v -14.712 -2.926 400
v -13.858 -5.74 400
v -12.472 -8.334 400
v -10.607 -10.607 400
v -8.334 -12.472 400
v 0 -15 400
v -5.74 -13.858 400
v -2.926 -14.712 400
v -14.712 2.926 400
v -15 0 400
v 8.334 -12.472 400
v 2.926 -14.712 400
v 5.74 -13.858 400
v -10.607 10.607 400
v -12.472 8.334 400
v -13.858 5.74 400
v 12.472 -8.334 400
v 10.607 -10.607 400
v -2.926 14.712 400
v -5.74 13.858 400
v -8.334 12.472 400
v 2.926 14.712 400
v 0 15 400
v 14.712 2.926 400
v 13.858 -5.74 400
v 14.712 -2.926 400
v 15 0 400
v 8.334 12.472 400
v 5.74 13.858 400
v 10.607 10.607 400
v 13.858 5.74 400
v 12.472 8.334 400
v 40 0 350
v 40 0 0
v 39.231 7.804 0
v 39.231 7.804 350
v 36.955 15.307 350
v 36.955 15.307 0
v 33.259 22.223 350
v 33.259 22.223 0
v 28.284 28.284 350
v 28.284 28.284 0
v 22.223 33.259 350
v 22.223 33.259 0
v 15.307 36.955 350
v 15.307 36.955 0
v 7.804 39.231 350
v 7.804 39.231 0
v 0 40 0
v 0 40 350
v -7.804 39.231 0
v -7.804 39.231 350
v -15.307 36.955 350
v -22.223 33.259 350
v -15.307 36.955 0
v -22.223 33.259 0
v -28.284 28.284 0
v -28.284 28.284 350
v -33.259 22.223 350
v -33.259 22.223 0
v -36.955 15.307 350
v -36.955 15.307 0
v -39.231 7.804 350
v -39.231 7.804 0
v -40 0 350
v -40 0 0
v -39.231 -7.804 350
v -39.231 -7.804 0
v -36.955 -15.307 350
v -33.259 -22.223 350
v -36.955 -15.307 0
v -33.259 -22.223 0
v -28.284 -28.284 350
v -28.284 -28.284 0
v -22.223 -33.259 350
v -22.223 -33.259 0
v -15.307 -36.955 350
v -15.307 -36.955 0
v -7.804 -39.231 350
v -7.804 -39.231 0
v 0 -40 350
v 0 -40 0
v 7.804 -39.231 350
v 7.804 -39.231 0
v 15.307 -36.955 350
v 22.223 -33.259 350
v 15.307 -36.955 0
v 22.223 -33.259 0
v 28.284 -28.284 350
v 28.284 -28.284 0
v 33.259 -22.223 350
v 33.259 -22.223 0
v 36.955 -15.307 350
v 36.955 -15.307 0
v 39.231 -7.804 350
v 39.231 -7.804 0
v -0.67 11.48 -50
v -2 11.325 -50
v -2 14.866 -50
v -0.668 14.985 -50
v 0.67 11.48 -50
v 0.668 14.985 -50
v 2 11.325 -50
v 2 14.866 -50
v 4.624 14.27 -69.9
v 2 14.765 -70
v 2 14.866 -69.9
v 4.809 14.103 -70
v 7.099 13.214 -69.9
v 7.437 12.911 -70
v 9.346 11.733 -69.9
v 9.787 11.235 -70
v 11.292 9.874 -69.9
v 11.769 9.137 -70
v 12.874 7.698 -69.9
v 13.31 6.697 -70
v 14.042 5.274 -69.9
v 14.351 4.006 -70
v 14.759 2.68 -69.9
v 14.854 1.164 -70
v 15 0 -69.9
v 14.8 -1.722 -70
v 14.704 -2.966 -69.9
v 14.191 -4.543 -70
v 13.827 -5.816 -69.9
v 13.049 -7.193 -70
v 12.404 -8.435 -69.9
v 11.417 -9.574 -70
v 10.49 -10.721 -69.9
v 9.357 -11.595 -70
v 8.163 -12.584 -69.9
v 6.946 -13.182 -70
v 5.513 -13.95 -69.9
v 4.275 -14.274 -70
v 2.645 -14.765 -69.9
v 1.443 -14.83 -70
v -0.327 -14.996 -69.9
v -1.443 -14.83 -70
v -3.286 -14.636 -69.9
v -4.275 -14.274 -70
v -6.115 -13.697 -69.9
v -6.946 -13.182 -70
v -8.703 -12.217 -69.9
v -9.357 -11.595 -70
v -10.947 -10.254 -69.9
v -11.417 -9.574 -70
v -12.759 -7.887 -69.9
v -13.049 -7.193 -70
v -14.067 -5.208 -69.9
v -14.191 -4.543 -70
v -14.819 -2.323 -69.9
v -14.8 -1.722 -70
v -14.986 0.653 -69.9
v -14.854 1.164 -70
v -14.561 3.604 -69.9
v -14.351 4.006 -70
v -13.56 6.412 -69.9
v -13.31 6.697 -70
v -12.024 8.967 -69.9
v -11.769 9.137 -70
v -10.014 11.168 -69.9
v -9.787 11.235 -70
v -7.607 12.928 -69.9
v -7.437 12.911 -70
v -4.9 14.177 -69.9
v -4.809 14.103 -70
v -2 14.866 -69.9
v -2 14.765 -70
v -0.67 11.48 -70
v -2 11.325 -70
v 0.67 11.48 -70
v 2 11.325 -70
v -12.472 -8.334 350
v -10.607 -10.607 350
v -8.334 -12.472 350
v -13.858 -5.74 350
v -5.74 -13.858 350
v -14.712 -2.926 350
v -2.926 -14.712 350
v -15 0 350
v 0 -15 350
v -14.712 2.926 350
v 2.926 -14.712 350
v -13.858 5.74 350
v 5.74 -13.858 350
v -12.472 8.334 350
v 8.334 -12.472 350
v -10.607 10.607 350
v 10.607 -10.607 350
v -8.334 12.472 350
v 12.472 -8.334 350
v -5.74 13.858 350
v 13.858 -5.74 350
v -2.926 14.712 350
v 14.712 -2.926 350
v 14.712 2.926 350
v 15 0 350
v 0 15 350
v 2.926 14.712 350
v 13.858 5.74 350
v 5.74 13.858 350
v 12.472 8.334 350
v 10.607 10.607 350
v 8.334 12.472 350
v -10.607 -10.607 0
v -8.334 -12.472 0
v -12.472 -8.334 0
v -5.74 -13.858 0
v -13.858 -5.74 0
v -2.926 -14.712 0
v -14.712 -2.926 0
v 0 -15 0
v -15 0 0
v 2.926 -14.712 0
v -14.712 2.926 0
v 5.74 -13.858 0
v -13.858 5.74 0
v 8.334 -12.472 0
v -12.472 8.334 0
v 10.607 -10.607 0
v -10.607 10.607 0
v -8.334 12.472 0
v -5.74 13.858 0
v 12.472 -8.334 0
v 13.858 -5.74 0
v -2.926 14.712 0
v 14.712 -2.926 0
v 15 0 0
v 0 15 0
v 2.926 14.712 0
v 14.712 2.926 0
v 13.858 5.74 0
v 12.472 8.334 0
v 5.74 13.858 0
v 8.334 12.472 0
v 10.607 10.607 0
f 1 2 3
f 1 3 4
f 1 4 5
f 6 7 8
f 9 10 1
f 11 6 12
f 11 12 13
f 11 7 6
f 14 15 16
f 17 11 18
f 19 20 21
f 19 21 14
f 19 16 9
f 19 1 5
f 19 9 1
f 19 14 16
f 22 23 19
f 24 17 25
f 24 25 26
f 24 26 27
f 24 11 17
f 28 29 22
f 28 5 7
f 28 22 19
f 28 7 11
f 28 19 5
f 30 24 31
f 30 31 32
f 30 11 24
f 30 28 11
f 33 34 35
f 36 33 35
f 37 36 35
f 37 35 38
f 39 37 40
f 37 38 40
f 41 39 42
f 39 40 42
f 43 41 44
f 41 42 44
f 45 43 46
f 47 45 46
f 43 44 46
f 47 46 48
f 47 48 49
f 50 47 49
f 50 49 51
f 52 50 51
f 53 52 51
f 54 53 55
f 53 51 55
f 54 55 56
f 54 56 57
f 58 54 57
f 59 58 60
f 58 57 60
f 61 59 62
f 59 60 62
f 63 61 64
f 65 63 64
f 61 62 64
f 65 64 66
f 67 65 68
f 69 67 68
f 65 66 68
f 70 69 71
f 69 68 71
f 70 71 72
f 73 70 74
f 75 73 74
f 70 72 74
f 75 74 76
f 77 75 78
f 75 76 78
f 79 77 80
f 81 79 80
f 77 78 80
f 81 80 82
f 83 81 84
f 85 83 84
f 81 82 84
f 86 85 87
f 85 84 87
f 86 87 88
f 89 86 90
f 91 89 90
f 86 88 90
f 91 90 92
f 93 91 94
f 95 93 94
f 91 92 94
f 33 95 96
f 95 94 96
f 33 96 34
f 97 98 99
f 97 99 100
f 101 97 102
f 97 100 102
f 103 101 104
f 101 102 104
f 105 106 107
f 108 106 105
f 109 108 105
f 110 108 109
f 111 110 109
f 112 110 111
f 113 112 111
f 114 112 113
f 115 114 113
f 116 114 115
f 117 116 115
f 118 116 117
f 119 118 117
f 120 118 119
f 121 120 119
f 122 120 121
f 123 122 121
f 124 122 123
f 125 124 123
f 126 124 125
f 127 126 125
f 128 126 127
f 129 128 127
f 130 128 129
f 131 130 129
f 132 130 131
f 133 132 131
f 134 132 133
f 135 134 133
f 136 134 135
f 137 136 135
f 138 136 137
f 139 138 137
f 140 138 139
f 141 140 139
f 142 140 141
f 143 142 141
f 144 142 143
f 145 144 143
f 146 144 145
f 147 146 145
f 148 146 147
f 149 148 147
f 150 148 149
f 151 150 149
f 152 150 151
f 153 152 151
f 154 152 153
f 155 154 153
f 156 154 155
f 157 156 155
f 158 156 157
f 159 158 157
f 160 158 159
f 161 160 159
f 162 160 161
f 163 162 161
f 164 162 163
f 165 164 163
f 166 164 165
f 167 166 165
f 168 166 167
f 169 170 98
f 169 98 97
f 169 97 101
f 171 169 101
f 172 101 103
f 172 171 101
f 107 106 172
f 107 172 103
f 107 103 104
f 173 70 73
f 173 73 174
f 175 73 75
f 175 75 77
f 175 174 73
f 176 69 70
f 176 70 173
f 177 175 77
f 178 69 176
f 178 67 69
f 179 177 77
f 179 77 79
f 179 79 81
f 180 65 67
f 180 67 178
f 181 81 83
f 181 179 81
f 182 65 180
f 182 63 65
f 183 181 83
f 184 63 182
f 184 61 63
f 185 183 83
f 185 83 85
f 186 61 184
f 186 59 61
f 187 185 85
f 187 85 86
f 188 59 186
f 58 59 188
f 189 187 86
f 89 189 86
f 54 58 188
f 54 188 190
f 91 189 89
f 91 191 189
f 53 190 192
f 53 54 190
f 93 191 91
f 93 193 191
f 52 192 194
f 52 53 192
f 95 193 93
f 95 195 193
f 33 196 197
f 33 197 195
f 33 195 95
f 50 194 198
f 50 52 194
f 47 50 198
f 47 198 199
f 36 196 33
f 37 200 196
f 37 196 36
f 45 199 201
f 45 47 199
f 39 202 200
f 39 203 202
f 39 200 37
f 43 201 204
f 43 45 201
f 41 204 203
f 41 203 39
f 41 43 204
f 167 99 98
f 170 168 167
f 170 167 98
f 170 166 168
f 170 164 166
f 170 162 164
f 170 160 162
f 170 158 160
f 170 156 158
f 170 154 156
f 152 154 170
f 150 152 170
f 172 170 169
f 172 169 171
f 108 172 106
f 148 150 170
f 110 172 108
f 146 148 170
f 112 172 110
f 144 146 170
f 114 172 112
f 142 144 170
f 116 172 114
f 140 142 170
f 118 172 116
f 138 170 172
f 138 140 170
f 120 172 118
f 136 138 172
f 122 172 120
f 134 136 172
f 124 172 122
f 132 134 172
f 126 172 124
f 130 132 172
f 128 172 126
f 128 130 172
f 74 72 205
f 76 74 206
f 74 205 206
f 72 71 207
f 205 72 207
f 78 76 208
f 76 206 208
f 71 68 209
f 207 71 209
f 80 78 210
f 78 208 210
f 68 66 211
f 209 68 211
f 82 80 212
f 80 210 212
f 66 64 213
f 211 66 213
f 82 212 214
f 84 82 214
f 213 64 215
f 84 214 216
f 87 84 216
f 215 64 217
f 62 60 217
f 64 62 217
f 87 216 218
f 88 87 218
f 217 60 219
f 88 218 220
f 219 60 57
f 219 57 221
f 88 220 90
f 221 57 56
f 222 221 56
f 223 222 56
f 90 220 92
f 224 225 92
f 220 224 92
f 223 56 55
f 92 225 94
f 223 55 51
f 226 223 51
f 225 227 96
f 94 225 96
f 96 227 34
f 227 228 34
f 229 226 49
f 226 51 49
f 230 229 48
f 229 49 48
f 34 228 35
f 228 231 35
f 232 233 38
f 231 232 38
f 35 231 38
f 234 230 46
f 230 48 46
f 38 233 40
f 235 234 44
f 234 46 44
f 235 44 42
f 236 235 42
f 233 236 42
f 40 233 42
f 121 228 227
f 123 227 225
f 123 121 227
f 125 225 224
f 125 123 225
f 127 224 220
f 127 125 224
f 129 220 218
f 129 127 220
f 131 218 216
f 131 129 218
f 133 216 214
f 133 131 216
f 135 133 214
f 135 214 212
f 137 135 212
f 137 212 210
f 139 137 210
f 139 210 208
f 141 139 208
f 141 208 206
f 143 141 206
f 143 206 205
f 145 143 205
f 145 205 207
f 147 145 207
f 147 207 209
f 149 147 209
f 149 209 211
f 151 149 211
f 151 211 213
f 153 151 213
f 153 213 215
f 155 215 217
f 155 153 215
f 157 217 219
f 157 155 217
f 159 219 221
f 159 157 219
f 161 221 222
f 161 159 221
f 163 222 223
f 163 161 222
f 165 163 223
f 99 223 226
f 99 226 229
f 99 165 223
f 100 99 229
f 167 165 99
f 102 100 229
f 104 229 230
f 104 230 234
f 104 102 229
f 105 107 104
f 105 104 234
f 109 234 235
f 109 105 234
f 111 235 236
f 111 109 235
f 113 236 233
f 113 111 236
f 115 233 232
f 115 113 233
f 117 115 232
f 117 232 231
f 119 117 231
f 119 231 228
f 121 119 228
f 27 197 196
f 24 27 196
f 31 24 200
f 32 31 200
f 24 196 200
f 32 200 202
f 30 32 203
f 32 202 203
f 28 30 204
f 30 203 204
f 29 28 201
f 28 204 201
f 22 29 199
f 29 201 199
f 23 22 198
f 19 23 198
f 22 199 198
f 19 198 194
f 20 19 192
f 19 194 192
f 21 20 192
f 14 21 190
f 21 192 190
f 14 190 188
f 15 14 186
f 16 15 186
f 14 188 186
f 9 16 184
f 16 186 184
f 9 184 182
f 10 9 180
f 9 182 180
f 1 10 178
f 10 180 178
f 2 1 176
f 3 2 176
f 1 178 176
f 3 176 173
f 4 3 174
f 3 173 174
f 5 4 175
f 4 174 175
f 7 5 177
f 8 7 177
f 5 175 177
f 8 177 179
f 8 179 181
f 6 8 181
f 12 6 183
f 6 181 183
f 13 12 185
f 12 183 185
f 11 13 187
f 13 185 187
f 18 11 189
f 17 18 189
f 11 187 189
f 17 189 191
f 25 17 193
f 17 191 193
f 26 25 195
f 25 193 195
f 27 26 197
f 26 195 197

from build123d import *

# Parameters (mm, degrees)
SKETCH1_R           = 40
BOSS_EXTRUDE1_DEPTH = 350
SKETCH2_R           = 15
BOSS_EXTRUDE2_DEPTH = 50
BOSS_EXTRUDE4_START = 70
SKETCH4_R           = 15
BOSS_EXTRUDE4_DEPTH = 70
CUT_EXTRUDE1_DEPTH  = 20
FILLET2_R           = 0.1


with BuildPart() as part:
    # Sketch1 → Boss-Extrude1 (new body)
    with BuildSketch(Plane.XY):
        Circle(SKETCH1_R)
    extrude(amount=BOSS_EXTRUDE1_DEPTH)

    # Sketch2 → Boss-Extrude2 (add)
    with BuildSketch(Plane.XY.offset(350)):
        Circle(SKETCH2_R)
    extrude(amount=BOSS_EXTRUDE2_DEPTH)

    # Sketch4 → Boss-Extrude4 (add)
    with BuildSketch(Plane(origin=(0, 0, 0), x_dir=(-1, 0, 0), z_dir=(0, 0, -1)).offset(BOSS_EXTRUDE4_START)):
        with Locations(Location((0, 0, 0), (0, 0, 180))):
            Circle(SKETCH4_R)
    extrude(amount=-BOSS_EXTRUDE4_DEPTH)

    # Sketch5 → Cut-Extrude1 (cut)
    with BuildSketch(Plane(origin=(0, 0, -70), x_dir=(-1, 0, 0), z_dir=(0, 0, -1))):
        with BuildLine():
            Line((-2, 11.324751653), (-2, 14.866068747))
            ThreePointArc((-2, 14.866068747), (0, 15), (2, 14.866068747))
            Line((2, 14.866068747), (2, 11.324751653))
            ThreePointArc((2, 11.324751653), (0, 11.5), (-2, 11.324751653))
        make_face()
    extrude(amount=-CUT_EXTRUDE1_DEPTH, mode=Mode.SUBTRACT)

    # Fillet2
    fillet2_edges = [part.edges().sort_by_distance(p)[0] for p in [
        (-9.874208829, -11.291589791, -70),
    ]]
    fillet(fillet2_edges, radius=FILLET2_R)


solid = part.part
